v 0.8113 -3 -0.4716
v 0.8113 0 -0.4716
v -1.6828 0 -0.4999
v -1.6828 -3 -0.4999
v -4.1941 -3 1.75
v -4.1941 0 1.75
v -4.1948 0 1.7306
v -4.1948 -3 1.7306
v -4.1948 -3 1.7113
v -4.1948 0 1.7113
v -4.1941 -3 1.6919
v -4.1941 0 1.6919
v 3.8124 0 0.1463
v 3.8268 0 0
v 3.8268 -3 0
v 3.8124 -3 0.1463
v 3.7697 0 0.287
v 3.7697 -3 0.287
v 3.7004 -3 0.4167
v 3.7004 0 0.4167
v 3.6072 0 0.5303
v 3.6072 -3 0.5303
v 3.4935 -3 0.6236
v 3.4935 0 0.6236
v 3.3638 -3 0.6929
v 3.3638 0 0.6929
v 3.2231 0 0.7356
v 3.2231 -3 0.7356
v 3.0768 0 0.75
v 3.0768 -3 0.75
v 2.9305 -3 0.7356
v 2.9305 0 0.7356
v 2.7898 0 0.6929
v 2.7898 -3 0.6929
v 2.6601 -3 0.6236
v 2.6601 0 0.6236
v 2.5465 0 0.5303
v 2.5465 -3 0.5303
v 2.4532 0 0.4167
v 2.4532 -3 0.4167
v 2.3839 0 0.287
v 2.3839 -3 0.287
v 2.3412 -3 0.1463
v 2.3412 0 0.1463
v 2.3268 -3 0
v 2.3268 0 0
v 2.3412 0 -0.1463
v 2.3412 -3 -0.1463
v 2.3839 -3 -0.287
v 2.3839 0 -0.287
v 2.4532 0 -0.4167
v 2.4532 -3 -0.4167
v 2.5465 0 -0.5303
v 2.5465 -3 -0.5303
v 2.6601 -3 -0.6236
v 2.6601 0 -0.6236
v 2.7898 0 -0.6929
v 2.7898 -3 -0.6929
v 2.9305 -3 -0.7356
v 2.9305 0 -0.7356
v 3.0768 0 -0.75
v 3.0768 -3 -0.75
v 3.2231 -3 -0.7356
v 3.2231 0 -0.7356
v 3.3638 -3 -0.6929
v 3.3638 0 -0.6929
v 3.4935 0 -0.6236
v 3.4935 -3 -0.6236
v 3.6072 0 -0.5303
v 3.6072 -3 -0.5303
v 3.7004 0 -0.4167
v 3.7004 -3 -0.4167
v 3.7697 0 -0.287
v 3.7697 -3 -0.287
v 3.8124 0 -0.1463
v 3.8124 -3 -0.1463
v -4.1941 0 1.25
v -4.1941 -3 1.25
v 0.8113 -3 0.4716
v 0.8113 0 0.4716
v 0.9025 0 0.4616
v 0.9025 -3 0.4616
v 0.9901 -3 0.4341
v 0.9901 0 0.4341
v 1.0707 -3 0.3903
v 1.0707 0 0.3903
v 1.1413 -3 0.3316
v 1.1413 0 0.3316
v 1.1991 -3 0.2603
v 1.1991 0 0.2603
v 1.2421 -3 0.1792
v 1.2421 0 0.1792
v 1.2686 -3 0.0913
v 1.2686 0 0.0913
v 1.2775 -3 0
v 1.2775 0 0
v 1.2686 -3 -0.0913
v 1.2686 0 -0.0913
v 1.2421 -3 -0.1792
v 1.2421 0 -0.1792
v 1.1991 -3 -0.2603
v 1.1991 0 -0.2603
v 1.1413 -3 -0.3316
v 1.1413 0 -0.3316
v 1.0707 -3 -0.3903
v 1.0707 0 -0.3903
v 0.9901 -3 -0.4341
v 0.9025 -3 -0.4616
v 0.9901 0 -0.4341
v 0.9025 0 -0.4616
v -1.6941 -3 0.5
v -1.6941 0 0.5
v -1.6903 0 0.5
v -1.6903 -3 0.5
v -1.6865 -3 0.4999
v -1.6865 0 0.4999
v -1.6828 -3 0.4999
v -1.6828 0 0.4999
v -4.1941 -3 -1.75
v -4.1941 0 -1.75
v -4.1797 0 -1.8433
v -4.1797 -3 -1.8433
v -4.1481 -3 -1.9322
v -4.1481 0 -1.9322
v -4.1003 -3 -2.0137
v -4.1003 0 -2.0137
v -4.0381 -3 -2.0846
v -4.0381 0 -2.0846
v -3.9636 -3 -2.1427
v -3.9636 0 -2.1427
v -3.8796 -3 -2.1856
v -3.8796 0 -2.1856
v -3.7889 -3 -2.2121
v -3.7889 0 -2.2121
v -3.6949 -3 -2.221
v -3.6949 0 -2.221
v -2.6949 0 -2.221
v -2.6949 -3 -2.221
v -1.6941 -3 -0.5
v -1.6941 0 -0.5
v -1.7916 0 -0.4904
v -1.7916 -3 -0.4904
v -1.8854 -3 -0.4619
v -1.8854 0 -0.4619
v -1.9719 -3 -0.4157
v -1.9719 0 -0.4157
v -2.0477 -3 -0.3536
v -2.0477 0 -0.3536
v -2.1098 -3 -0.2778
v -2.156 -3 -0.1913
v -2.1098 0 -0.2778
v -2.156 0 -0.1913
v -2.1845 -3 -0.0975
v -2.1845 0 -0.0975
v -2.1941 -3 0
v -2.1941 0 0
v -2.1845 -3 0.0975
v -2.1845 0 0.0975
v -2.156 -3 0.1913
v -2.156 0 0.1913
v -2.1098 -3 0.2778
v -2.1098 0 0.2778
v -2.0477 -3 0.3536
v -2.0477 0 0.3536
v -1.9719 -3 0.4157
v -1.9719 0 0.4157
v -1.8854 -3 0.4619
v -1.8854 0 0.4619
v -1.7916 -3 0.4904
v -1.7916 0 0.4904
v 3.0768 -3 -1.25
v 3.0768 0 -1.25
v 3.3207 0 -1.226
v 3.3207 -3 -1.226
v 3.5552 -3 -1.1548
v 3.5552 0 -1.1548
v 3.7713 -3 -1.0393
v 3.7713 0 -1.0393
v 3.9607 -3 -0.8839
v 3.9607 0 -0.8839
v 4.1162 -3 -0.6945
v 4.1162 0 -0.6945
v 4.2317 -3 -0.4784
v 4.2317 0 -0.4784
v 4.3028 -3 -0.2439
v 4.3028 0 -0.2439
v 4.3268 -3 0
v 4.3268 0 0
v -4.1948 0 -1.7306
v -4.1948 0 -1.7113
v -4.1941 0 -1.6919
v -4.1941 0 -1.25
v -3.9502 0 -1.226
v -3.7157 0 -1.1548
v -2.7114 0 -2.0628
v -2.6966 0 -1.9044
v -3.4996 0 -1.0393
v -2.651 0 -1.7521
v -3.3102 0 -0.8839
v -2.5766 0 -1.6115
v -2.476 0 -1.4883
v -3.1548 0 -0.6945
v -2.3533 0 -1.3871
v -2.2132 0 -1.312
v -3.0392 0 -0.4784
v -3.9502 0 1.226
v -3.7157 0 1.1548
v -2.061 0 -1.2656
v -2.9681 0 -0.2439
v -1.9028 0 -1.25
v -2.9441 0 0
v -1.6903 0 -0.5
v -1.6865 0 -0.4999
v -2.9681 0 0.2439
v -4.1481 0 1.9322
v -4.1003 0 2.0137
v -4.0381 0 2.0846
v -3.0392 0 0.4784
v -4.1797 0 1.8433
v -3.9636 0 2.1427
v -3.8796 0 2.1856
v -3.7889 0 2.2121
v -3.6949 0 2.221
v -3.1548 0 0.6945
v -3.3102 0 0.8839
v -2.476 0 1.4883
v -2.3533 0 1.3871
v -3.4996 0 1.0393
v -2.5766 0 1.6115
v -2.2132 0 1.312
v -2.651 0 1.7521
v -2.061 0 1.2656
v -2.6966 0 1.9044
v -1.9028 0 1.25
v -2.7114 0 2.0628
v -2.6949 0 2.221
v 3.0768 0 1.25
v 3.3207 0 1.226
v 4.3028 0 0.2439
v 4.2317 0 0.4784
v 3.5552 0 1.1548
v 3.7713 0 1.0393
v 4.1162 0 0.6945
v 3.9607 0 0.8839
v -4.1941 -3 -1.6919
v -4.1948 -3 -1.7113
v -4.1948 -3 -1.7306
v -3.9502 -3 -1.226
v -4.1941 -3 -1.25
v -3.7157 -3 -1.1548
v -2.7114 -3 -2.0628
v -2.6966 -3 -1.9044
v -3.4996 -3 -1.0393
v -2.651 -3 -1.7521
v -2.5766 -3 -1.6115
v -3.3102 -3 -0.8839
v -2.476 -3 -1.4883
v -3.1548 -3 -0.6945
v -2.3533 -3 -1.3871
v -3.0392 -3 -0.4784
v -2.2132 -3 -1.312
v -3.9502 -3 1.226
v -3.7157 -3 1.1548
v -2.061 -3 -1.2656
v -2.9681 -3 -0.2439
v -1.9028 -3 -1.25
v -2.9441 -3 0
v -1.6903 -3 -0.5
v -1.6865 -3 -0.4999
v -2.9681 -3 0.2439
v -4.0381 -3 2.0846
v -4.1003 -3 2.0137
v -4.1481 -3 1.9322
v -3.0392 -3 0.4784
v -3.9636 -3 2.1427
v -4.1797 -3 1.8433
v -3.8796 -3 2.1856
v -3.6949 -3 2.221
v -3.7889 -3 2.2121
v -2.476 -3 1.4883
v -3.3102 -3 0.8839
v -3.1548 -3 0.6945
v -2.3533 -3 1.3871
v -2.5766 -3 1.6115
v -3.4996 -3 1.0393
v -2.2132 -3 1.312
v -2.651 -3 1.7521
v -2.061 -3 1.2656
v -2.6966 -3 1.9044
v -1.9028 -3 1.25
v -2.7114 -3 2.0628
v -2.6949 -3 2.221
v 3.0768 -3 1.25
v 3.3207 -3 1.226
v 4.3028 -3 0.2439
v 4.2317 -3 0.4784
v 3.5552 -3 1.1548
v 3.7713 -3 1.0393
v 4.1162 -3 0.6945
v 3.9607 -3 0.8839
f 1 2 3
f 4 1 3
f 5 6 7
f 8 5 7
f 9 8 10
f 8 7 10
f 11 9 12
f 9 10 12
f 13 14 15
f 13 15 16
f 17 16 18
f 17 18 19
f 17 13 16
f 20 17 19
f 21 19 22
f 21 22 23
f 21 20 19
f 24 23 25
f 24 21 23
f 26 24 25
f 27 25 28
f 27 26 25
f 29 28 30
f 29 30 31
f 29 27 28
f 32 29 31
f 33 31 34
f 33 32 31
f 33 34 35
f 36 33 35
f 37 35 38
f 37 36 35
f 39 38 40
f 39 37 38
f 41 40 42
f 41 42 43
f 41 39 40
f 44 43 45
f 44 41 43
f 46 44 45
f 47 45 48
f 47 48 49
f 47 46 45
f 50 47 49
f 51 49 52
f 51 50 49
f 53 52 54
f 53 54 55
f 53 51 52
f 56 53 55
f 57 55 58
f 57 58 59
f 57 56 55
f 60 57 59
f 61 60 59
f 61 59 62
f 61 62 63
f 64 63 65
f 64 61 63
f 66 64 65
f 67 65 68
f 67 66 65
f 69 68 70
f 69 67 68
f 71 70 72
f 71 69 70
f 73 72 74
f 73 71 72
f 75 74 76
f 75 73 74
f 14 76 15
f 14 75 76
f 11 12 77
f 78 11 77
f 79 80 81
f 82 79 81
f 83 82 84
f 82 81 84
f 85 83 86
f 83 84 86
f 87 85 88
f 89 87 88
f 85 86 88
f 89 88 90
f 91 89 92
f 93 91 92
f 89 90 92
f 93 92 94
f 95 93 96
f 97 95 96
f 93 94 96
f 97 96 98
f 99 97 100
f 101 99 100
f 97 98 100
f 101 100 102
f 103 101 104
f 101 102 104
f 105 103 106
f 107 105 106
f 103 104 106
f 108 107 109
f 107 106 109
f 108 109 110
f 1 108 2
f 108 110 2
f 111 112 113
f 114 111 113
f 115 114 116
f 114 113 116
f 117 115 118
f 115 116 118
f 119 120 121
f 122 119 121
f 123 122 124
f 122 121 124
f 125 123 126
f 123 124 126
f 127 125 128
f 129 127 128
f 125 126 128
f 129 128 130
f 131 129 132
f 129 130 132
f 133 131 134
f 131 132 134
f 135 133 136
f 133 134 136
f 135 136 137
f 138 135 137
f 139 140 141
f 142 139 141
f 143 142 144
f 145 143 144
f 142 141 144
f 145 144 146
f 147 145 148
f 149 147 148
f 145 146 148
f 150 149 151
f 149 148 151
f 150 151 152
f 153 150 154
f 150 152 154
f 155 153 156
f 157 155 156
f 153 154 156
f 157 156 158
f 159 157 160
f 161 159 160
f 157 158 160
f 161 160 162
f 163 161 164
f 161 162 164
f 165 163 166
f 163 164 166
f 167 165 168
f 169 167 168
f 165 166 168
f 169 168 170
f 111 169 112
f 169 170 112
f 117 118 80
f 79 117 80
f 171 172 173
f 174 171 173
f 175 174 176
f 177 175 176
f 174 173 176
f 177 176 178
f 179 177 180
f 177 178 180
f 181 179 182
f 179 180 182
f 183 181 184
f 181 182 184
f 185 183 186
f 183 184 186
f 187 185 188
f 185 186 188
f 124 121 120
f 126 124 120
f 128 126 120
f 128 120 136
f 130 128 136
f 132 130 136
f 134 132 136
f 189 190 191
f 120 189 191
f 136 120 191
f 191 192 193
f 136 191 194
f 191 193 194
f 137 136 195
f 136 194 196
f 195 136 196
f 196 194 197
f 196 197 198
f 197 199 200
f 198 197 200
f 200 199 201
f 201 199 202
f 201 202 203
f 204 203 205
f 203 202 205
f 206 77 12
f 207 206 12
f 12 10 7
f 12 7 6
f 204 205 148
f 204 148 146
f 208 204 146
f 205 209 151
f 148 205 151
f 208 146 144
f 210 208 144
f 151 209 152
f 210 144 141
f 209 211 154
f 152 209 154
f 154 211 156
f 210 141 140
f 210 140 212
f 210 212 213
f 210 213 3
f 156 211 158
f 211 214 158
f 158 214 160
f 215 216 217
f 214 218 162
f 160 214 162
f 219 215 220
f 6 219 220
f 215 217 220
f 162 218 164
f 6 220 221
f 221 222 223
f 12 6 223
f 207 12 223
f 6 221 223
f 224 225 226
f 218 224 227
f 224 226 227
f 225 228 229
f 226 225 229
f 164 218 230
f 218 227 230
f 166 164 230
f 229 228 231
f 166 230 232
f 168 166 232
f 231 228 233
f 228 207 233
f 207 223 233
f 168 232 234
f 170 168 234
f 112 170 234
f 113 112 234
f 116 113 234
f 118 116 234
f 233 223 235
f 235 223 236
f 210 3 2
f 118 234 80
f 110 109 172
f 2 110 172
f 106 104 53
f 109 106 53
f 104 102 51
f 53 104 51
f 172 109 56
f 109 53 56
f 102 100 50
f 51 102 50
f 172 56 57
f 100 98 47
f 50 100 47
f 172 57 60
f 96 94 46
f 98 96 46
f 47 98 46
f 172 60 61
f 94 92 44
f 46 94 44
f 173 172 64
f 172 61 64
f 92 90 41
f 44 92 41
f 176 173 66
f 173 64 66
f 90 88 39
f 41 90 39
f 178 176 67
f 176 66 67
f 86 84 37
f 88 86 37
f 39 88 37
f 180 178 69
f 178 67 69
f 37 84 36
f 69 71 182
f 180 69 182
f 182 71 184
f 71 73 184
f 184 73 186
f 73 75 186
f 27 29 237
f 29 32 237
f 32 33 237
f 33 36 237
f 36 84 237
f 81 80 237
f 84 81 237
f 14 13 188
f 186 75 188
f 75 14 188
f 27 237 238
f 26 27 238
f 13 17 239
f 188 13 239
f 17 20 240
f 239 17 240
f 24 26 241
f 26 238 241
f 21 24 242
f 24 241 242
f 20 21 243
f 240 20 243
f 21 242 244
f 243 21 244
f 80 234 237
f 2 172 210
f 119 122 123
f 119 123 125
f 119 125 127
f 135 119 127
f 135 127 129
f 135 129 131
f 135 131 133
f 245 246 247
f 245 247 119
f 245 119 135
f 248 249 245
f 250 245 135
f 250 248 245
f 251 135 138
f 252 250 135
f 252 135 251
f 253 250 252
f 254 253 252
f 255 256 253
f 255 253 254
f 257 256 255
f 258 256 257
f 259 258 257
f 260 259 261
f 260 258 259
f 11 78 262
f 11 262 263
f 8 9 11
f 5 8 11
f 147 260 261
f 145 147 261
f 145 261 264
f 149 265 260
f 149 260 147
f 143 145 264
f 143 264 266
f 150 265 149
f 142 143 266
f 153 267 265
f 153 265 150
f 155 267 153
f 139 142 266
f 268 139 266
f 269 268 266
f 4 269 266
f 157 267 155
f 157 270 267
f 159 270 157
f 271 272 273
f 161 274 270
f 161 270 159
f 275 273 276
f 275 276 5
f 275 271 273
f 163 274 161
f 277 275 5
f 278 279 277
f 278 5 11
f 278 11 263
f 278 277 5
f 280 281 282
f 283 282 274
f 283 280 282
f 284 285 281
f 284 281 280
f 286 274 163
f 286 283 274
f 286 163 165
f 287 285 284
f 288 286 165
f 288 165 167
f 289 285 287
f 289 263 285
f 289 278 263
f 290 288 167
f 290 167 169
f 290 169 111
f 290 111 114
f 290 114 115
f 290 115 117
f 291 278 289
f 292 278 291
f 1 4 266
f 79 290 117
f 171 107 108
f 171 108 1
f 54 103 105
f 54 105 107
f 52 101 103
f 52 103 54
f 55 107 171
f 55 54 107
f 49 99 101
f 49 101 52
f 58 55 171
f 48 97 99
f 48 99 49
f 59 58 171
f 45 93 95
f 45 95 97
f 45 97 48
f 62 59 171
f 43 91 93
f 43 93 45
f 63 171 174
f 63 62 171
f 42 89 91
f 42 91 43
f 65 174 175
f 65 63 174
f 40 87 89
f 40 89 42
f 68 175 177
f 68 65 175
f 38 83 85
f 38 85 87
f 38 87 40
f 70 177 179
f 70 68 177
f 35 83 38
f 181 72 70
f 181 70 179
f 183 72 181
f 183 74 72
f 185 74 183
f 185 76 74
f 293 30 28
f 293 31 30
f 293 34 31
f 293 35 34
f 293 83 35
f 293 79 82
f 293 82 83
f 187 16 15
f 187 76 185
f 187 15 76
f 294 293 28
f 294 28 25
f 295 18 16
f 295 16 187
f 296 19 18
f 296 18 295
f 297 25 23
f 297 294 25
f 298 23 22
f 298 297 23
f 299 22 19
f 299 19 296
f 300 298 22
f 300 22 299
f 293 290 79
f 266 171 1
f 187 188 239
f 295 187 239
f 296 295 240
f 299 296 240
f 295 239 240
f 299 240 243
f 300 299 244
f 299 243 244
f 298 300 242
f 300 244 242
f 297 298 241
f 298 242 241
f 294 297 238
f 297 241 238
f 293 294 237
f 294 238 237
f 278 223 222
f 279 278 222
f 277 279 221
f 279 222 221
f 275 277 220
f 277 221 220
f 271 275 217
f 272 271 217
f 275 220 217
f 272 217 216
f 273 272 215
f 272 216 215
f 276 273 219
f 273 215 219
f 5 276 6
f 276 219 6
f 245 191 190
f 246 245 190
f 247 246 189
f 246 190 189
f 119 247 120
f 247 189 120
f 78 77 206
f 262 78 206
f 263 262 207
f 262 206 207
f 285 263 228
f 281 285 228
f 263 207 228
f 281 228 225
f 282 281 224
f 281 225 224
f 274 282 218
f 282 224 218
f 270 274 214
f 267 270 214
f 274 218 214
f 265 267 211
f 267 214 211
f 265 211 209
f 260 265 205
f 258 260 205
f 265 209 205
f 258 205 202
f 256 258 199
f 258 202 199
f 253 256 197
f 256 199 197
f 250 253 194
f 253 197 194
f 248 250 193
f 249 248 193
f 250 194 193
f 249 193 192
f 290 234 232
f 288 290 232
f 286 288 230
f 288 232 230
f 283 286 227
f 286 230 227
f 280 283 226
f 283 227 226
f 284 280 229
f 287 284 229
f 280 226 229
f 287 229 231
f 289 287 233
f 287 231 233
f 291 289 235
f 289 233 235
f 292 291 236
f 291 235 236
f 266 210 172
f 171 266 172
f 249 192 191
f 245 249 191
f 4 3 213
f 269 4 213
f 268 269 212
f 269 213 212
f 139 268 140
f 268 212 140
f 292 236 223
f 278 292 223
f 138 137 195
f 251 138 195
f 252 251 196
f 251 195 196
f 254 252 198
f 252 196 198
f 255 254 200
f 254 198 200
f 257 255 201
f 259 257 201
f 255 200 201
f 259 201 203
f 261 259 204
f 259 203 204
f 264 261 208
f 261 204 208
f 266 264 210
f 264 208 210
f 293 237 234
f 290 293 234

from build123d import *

# Parameters (mm, degrees)
F0_R     = 0.75
F1_DEPTH = 3


with BuildPart() as f1:
    # F0 (on Front) → F1 (new body)
    with BuildSketch(Plane.XZ):
        with BuildLine():
            ThreePointArc((3.076821, -1.25), (3.960705, -0.883883), (4.326821, 0))
            ThreePointArc((4.326821, 0), (3.960705, 0.883883), (3.076821, 1.25))
            ThreePointArc((3.076821, 1.25), (1.826821, 0), (3.076821, -1.25))
        make_face()
        with Locations((3.076821, 0)):
            Circle(F0_R, mode=Mode.SUBTRACT)
        with BuildLine():
            ThreePointArc((3.076821, -1.25), (1.826821, 0), (3.076821, 1.25))
            Line((3.076821, 1.25), (-1.902765, 1.25))
            ThreePointArc((-1.902765, 1.25), (-2.529328, 1.547448), (-2.694943, 2.220968))
            Line((-2.694943, 2.220968), (-3.694943, 2.220968))
            ThreePointArc((-3.694943, 2.220968), (-4.038078, 2.084641), (-4.194099, 1.75))
            Line((-4.194099, 1.75), (-4.194099, 1.691935))
            Line((-4.194099, 1.691935), (-4.194099, 1.25))
            ThreePointArc((-4.194099, 1.25), (-2.944099, 0), (-4.194099, -1.25))
            Line((-4.194099, -1.25), (-4.194099, -1.691935))
            Line((-4.194099, -1.691935), (-4.194099, -1.75))
            ThreePointArc((-4.194099, -1.75), (-4.038078, -2.084641), (-3.694943, -2.220968))
            Line((-3.694943, -2.220968), (-2.694943, -2.220968))
            ThreePointArc((-2.694943, -2.220968), (-2.529328, -1.547448), (-1.902765, -1.25))
            Line((-1.902765, -1.25), (3.076821, -1.25))
        make_face()
        with BuildLine():
            ThreePointArc((-1.694099, 0.5), (-1.688425, 0.499968), (-1.682752, 0.499871))
            Line((-1.682752, 0.499871), (0.811253, 0.471568))
            ThreePointArc((0.811253, 0.471568), (1.277499, 0), (0.811253, -0.471568))
            Line((0.811253, -0.471568), (-1.682752, -0.499871))
            ThreePointArc((-1.682752, -0.499871), (-1.688425, -0.499968), (-1.694099, -0.5))
            ThreePointArc((-1.694099, -0.5), (-2.194099, 0), (-1.694099, 0.5))
        make_face(mode=Mode.SUBTRACT)
        with BuildLine():
            Line((-4.194099, 1.691935), (-4.194099, 1.75))
            ThreePointArc((-4.194099, 1.75), (-4.194943, 1.720968), (-4.194099, 1.691935))
        make_face()
        with BuildLine():
            ThreePointArc((-4.194099, -1.691935), (-4.194943, -1.720968), (-4.194099, -1.75))
            Line((-4.194099, -1.75), (-4.194099, -1.691935))
        make_face()
    extrude(amount=F1_DEPTH)


solid = f1.part
